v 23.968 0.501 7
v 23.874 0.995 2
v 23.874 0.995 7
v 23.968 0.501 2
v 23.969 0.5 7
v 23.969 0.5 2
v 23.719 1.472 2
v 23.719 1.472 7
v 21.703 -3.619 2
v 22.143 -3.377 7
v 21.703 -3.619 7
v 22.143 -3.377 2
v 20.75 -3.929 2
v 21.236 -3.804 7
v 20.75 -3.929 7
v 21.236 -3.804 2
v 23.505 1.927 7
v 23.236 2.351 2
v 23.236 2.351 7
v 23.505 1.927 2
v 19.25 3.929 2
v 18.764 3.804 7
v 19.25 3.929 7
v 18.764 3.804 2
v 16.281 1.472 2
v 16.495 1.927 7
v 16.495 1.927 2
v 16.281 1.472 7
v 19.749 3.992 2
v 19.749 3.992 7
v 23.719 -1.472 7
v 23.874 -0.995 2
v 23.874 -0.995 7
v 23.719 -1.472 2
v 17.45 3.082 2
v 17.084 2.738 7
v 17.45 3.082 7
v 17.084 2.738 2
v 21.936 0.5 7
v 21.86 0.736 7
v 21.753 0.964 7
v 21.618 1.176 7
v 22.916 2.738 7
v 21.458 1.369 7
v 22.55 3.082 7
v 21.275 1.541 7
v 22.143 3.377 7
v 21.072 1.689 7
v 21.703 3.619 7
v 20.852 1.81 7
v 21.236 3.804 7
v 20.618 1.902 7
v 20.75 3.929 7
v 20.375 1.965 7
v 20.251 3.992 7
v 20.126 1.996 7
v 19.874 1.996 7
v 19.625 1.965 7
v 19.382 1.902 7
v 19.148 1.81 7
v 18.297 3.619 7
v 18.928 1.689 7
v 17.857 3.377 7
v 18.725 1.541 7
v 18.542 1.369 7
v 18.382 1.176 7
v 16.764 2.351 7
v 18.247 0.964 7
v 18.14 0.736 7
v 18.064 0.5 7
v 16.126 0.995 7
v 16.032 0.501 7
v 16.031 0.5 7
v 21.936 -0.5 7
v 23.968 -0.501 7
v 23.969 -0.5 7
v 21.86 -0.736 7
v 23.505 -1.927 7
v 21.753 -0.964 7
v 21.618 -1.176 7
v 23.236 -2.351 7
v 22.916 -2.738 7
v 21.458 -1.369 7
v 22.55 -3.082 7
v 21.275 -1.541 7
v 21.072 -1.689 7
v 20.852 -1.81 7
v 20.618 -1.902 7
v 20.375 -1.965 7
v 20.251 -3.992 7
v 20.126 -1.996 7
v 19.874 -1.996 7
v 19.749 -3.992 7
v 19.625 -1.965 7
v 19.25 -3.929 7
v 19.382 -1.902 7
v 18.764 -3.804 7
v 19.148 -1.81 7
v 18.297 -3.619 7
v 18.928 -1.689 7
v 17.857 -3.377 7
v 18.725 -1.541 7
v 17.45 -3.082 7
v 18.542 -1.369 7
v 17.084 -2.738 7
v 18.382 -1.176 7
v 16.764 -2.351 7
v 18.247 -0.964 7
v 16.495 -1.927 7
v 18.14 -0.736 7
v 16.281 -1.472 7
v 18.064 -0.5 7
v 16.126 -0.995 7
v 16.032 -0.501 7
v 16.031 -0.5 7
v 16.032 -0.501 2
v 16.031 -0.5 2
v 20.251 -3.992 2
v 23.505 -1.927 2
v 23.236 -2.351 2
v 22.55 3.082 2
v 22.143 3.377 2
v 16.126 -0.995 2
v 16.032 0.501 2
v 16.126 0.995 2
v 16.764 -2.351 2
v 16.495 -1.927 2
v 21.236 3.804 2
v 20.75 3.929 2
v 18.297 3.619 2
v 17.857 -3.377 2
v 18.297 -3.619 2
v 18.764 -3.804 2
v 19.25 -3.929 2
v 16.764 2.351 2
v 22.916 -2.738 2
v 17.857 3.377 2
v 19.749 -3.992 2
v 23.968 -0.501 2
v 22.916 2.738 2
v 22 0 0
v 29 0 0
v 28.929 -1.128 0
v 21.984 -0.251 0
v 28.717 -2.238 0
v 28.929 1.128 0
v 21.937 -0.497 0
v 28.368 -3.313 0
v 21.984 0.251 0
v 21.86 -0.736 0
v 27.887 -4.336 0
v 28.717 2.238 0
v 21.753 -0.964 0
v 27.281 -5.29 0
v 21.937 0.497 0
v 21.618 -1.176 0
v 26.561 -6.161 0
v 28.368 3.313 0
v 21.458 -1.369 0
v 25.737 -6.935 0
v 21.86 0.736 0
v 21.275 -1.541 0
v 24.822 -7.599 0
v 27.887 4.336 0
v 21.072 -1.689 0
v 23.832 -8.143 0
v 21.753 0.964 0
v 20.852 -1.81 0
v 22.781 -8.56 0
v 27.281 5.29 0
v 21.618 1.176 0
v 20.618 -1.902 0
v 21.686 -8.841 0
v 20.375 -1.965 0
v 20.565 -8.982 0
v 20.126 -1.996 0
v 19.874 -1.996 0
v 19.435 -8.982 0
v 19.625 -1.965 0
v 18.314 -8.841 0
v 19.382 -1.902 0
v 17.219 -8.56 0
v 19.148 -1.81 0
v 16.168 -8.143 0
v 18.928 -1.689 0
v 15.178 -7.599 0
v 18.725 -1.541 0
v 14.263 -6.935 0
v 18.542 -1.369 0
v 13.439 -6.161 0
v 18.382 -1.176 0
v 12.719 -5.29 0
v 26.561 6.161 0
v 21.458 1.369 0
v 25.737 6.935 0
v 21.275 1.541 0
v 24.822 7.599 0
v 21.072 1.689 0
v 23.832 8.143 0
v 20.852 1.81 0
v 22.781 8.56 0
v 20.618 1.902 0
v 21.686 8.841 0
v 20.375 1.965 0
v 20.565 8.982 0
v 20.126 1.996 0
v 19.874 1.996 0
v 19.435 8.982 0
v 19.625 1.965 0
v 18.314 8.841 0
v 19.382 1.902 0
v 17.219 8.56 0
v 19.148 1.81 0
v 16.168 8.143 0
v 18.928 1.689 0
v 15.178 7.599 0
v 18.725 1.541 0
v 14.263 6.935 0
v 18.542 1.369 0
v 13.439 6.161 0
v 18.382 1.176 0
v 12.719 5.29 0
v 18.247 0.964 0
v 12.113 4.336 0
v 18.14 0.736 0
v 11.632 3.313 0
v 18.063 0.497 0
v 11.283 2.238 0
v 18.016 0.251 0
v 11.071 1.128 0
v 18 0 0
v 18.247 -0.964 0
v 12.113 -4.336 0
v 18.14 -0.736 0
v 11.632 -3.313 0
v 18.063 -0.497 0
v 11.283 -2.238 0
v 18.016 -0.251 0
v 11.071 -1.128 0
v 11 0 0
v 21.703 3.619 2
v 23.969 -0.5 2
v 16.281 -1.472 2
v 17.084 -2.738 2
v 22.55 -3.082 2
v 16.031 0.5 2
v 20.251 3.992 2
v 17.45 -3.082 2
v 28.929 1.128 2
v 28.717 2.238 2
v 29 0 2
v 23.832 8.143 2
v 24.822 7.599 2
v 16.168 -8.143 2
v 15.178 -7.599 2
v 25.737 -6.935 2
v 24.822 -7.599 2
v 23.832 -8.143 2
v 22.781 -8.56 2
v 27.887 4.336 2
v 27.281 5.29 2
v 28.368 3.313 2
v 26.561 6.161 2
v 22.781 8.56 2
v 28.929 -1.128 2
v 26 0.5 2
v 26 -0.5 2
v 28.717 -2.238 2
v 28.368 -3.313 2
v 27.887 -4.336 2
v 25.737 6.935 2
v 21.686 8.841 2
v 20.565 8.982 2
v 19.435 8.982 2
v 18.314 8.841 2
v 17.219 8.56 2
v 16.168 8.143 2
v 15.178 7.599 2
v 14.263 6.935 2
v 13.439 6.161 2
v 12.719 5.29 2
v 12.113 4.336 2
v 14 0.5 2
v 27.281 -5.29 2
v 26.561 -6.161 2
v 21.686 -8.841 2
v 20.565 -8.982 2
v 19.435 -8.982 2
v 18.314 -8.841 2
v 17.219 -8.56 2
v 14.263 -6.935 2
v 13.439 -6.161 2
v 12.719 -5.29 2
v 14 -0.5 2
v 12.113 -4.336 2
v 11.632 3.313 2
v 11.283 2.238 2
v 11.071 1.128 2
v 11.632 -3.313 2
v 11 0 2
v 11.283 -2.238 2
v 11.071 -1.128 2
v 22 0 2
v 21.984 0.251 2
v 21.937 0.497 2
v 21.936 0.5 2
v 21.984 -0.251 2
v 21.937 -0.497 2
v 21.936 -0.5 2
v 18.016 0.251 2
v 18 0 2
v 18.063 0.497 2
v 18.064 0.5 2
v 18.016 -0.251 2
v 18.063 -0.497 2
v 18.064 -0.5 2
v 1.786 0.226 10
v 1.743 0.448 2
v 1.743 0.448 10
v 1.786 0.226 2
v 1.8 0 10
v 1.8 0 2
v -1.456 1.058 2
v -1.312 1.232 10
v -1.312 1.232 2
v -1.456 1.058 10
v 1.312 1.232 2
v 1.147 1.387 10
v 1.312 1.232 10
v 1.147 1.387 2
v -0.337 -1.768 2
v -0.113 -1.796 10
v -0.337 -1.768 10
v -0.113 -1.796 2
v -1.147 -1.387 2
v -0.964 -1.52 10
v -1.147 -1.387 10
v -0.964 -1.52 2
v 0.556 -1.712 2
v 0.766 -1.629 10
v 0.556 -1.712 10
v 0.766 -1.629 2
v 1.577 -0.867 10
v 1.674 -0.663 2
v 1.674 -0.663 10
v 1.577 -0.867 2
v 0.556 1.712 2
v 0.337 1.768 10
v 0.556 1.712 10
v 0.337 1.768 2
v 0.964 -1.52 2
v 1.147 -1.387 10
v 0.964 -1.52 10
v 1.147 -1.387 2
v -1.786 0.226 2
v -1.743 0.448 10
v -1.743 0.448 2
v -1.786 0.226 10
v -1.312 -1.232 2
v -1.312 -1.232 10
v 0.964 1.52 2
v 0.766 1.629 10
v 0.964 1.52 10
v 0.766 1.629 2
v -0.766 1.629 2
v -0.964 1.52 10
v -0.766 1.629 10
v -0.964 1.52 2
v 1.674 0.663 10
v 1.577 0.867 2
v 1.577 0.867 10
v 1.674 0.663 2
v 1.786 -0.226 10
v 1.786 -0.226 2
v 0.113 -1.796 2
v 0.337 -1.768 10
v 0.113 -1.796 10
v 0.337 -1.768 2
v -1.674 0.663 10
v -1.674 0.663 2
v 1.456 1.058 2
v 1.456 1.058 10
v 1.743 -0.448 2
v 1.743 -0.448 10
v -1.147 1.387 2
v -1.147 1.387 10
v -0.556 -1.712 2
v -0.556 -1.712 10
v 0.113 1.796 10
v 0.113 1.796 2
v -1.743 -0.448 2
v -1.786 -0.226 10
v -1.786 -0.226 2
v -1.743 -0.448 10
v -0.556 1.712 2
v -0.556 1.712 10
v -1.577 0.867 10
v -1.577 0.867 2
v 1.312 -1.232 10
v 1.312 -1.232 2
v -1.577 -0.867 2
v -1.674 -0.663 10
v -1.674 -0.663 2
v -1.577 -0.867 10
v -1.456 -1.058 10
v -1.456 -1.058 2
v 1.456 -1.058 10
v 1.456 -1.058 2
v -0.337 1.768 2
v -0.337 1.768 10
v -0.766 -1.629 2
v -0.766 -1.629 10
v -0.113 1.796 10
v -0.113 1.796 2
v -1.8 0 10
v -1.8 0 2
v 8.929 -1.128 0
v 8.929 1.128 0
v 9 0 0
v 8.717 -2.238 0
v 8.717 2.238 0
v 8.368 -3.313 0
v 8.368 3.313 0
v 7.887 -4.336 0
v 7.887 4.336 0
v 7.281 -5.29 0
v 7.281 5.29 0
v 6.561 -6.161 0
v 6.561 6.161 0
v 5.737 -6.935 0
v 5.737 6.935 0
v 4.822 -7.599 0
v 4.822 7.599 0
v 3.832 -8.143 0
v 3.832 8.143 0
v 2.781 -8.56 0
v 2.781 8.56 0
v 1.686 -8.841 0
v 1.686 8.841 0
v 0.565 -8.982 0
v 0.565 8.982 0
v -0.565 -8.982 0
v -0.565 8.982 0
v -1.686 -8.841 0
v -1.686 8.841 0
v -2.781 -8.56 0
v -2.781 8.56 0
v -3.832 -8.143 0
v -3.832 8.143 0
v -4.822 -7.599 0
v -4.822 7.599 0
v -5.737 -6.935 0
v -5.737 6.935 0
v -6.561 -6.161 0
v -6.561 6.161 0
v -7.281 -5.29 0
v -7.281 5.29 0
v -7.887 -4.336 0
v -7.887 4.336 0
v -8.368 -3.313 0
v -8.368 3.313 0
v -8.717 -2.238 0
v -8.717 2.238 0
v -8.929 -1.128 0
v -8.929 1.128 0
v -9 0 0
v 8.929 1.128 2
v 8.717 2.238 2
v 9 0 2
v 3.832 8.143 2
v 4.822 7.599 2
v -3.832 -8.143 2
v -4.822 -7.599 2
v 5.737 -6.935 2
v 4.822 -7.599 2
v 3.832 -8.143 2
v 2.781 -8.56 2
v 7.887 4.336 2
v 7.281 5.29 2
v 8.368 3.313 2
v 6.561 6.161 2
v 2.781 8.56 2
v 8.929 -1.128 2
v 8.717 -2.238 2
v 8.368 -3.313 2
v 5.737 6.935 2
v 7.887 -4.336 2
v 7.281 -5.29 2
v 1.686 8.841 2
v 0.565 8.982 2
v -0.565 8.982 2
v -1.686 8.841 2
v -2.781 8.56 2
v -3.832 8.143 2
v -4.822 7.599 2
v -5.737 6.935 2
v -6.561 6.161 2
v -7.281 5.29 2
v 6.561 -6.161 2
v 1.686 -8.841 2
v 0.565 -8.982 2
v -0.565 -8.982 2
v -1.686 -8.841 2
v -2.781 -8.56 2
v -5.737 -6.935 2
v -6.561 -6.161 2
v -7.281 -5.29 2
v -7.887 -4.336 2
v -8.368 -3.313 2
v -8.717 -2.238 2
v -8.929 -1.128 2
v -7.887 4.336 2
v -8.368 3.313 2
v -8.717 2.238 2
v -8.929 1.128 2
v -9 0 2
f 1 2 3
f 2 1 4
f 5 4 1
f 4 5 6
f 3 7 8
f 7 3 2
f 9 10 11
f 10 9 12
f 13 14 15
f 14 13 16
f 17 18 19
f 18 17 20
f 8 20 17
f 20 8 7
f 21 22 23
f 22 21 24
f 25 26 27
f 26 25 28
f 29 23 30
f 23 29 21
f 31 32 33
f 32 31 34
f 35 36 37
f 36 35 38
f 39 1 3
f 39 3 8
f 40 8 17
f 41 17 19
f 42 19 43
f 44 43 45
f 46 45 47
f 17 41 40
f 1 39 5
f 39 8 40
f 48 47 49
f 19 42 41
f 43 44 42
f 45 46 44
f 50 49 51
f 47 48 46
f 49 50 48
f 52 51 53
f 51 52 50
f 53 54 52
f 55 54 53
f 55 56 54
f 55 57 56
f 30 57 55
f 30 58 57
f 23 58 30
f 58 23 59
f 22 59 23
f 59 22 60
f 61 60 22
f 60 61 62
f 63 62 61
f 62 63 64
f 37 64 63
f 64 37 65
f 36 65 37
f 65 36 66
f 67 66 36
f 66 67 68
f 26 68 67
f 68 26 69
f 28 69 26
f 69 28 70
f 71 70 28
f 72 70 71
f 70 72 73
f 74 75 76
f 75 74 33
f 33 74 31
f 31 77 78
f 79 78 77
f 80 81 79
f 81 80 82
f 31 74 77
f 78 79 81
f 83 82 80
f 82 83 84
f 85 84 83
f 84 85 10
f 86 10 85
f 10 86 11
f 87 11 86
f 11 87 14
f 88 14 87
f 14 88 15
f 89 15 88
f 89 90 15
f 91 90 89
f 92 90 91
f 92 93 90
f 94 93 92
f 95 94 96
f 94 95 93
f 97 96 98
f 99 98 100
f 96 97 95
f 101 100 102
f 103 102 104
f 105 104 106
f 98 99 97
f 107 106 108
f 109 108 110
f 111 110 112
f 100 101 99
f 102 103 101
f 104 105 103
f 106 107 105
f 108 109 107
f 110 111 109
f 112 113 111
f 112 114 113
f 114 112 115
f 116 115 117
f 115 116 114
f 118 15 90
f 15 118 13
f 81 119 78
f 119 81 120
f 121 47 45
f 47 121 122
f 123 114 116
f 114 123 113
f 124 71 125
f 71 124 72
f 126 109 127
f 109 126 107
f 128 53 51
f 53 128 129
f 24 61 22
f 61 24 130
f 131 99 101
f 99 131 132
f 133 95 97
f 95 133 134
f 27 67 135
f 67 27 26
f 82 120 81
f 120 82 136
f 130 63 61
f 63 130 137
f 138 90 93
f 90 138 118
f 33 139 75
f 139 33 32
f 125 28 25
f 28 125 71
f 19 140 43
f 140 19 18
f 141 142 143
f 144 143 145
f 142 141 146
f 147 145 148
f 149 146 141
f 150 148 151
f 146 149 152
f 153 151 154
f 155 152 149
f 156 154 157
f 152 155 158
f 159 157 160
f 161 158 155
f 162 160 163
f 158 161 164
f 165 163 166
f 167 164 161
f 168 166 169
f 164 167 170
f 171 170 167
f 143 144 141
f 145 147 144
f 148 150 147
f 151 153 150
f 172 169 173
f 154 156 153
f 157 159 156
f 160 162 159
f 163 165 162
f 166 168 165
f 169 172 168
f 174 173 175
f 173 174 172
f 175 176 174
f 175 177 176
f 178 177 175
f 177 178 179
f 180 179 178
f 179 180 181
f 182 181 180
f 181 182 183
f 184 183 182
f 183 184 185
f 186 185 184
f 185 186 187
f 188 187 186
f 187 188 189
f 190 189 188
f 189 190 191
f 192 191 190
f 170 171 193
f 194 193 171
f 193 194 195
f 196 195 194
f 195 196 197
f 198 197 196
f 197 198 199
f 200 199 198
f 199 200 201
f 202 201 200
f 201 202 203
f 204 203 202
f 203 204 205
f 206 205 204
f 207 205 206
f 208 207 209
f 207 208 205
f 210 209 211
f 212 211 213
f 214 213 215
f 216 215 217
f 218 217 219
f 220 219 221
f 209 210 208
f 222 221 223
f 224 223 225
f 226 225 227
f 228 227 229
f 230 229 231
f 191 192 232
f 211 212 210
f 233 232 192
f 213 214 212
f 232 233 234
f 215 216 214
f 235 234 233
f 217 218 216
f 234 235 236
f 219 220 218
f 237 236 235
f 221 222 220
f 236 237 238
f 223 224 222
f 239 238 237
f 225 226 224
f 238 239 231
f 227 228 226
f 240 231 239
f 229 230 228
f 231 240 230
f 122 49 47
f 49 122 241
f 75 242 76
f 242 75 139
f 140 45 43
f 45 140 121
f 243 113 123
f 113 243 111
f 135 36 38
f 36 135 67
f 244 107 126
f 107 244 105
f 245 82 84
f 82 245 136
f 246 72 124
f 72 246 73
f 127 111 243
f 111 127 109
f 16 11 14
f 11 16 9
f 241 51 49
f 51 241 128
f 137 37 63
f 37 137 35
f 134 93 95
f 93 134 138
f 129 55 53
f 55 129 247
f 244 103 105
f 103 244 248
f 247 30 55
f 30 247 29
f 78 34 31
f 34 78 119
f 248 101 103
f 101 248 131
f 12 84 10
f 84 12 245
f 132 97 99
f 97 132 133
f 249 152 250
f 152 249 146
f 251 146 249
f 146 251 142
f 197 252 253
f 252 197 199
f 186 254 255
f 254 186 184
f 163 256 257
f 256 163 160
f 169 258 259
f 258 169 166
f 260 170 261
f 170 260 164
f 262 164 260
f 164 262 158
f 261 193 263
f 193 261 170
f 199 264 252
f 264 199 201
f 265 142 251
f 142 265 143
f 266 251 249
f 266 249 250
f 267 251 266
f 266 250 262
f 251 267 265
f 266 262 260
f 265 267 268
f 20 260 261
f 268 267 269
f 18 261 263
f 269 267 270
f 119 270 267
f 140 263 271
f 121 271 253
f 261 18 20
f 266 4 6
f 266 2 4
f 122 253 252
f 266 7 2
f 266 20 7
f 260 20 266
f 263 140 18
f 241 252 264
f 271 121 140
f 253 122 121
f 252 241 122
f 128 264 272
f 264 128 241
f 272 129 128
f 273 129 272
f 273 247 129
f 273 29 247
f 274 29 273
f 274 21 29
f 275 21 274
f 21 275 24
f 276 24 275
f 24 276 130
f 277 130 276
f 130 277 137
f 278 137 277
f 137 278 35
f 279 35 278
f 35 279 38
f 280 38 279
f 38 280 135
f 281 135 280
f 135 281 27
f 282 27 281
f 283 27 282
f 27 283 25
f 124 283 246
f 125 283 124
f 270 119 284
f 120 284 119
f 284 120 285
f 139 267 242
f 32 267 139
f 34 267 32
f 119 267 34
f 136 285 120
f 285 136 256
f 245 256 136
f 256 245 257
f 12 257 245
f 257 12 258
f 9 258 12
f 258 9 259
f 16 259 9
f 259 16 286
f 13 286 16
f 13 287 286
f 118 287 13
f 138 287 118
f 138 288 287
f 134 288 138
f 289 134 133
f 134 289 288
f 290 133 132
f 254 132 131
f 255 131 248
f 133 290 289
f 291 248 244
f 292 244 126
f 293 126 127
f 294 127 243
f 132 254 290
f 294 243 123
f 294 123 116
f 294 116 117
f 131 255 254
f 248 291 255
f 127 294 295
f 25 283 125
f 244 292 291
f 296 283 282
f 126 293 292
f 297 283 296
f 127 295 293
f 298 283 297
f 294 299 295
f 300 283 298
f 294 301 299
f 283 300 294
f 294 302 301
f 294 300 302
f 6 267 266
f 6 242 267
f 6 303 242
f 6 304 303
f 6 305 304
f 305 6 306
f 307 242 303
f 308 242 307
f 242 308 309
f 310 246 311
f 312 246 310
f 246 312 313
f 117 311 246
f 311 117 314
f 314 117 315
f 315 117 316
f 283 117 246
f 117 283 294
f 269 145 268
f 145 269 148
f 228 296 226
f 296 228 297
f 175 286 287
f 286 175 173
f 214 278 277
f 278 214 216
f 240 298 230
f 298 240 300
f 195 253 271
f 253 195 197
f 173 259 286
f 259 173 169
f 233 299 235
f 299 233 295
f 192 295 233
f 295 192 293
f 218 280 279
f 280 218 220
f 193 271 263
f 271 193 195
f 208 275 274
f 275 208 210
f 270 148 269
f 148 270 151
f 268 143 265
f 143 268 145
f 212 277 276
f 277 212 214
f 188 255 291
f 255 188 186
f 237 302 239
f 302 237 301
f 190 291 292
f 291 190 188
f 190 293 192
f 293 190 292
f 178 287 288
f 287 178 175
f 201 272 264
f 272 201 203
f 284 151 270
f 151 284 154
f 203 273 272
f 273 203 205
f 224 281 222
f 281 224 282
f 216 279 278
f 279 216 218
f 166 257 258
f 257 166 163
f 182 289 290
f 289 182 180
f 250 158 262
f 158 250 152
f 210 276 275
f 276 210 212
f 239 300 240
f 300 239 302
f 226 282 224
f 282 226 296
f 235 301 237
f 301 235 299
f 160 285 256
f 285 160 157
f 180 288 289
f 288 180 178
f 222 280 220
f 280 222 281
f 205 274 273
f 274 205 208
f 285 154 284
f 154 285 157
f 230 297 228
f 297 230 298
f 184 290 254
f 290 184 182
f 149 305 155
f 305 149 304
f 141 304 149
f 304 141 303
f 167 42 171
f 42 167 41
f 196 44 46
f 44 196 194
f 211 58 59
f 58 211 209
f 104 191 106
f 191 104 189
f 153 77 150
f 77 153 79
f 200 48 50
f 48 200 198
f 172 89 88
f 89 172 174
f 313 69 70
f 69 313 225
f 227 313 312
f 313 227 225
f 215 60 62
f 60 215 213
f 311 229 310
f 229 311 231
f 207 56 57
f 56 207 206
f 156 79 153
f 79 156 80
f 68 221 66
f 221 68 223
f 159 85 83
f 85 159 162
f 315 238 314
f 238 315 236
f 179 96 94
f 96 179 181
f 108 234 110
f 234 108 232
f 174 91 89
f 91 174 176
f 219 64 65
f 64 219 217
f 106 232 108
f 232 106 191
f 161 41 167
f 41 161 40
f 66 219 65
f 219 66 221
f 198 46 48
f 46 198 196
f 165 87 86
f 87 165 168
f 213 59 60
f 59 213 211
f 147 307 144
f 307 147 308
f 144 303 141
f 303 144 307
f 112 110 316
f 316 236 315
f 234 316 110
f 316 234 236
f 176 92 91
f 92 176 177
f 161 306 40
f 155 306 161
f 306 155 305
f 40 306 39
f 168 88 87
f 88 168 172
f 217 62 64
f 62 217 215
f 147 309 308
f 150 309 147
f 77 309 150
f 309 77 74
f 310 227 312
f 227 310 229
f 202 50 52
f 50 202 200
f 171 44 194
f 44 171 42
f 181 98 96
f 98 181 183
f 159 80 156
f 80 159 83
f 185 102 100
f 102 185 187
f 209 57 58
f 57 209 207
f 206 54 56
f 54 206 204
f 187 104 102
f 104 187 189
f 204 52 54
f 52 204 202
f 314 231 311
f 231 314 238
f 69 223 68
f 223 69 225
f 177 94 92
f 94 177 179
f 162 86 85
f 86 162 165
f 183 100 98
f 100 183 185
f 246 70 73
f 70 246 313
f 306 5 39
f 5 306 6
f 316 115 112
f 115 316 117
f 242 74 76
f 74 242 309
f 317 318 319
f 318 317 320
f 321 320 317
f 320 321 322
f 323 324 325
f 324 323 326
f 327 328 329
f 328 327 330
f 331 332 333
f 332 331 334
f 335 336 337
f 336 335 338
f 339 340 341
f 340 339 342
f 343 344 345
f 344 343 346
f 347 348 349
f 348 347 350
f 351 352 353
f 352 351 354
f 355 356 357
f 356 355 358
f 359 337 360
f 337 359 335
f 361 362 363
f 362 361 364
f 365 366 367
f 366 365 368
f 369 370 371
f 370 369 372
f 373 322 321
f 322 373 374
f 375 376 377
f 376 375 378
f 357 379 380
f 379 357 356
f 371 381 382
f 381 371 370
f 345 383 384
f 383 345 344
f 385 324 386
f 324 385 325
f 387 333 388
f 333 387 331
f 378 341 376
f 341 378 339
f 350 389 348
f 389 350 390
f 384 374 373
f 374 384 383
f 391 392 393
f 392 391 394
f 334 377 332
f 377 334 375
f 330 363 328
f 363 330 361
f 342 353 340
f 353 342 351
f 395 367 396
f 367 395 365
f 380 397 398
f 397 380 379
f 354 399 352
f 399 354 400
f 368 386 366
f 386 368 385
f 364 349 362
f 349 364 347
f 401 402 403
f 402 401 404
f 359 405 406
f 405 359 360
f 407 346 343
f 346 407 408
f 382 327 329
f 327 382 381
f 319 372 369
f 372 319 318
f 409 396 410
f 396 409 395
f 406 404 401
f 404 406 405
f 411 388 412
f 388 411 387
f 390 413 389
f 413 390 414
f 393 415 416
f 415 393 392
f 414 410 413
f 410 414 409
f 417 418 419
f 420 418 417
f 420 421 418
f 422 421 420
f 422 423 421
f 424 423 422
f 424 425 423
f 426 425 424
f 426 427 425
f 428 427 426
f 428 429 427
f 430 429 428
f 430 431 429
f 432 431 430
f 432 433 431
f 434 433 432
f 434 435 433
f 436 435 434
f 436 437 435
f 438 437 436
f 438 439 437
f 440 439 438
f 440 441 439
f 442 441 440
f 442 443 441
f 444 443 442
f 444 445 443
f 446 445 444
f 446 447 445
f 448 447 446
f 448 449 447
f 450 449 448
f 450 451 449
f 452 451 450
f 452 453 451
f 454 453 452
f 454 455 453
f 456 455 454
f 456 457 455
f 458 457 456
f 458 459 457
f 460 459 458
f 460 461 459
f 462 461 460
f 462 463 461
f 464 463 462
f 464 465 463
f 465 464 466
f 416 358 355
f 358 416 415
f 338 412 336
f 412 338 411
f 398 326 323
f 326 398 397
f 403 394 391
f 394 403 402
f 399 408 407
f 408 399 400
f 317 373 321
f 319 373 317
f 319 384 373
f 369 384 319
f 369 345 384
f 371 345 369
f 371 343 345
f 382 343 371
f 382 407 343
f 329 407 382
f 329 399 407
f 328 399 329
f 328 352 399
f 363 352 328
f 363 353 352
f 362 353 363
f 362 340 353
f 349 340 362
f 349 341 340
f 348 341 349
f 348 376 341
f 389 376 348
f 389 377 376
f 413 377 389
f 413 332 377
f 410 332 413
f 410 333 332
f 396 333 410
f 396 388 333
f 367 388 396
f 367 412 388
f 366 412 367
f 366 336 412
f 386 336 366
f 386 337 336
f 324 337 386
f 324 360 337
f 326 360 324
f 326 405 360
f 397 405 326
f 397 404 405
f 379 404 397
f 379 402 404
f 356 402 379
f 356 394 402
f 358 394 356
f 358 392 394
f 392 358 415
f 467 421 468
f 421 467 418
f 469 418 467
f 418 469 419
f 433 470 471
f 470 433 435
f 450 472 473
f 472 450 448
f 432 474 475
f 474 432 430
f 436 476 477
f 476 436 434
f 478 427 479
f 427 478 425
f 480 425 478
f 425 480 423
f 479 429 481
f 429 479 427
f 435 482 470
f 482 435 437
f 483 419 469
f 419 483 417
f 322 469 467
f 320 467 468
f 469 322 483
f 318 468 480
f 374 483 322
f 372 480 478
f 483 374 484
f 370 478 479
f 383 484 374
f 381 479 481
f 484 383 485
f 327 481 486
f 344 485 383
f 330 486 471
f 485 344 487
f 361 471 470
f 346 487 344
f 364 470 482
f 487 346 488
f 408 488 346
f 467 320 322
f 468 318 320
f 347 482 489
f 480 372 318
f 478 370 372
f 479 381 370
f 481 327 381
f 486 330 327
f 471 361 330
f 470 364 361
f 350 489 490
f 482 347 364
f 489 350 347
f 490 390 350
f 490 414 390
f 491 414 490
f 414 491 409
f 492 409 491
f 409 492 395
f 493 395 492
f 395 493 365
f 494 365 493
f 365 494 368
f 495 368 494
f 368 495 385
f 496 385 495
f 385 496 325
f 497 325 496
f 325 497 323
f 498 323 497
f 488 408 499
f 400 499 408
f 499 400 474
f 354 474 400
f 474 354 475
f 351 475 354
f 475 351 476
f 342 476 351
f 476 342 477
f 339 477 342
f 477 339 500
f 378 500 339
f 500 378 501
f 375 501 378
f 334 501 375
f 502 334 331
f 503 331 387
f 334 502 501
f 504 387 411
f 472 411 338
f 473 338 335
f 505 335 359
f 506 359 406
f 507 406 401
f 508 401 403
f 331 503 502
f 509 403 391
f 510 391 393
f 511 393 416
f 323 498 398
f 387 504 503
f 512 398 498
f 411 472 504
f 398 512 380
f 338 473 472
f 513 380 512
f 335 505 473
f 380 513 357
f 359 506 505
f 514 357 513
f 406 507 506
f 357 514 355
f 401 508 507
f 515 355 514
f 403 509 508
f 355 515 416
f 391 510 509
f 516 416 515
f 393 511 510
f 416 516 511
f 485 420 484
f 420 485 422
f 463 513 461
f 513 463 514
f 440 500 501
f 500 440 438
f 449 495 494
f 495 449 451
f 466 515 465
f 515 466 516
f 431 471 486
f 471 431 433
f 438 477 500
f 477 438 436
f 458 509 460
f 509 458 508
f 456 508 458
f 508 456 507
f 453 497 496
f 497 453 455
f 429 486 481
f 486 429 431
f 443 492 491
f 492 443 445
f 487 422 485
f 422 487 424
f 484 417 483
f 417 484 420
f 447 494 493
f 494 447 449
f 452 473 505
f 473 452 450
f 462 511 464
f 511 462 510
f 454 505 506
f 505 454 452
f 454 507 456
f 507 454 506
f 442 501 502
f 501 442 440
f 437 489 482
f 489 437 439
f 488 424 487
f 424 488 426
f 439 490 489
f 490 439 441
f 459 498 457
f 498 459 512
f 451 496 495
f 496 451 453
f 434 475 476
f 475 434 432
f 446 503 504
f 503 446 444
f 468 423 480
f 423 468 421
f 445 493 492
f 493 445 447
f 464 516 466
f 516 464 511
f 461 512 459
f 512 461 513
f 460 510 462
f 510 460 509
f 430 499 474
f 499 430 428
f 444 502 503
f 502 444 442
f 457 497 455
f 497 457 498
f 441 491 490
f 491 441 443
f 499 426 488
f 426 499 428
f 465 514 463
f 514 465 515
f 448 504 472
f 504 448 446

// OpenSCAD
$fn = 50;

module bottom(){
difference(){
    union(){
        cylinder(7,4,4);
        cylinder(2,9,9);
    }
    translate([0,0,-1]) cylinder(12,2,2);
    translate([-6,-0.5,2]) cube([12,1,5]);
}
}

module topo(){
    union(){
        cylinder(10,1.8,1.8);
        cylinder(2,9,9);
    }
}

    translate([20,0,0]) bottom();
topo();
